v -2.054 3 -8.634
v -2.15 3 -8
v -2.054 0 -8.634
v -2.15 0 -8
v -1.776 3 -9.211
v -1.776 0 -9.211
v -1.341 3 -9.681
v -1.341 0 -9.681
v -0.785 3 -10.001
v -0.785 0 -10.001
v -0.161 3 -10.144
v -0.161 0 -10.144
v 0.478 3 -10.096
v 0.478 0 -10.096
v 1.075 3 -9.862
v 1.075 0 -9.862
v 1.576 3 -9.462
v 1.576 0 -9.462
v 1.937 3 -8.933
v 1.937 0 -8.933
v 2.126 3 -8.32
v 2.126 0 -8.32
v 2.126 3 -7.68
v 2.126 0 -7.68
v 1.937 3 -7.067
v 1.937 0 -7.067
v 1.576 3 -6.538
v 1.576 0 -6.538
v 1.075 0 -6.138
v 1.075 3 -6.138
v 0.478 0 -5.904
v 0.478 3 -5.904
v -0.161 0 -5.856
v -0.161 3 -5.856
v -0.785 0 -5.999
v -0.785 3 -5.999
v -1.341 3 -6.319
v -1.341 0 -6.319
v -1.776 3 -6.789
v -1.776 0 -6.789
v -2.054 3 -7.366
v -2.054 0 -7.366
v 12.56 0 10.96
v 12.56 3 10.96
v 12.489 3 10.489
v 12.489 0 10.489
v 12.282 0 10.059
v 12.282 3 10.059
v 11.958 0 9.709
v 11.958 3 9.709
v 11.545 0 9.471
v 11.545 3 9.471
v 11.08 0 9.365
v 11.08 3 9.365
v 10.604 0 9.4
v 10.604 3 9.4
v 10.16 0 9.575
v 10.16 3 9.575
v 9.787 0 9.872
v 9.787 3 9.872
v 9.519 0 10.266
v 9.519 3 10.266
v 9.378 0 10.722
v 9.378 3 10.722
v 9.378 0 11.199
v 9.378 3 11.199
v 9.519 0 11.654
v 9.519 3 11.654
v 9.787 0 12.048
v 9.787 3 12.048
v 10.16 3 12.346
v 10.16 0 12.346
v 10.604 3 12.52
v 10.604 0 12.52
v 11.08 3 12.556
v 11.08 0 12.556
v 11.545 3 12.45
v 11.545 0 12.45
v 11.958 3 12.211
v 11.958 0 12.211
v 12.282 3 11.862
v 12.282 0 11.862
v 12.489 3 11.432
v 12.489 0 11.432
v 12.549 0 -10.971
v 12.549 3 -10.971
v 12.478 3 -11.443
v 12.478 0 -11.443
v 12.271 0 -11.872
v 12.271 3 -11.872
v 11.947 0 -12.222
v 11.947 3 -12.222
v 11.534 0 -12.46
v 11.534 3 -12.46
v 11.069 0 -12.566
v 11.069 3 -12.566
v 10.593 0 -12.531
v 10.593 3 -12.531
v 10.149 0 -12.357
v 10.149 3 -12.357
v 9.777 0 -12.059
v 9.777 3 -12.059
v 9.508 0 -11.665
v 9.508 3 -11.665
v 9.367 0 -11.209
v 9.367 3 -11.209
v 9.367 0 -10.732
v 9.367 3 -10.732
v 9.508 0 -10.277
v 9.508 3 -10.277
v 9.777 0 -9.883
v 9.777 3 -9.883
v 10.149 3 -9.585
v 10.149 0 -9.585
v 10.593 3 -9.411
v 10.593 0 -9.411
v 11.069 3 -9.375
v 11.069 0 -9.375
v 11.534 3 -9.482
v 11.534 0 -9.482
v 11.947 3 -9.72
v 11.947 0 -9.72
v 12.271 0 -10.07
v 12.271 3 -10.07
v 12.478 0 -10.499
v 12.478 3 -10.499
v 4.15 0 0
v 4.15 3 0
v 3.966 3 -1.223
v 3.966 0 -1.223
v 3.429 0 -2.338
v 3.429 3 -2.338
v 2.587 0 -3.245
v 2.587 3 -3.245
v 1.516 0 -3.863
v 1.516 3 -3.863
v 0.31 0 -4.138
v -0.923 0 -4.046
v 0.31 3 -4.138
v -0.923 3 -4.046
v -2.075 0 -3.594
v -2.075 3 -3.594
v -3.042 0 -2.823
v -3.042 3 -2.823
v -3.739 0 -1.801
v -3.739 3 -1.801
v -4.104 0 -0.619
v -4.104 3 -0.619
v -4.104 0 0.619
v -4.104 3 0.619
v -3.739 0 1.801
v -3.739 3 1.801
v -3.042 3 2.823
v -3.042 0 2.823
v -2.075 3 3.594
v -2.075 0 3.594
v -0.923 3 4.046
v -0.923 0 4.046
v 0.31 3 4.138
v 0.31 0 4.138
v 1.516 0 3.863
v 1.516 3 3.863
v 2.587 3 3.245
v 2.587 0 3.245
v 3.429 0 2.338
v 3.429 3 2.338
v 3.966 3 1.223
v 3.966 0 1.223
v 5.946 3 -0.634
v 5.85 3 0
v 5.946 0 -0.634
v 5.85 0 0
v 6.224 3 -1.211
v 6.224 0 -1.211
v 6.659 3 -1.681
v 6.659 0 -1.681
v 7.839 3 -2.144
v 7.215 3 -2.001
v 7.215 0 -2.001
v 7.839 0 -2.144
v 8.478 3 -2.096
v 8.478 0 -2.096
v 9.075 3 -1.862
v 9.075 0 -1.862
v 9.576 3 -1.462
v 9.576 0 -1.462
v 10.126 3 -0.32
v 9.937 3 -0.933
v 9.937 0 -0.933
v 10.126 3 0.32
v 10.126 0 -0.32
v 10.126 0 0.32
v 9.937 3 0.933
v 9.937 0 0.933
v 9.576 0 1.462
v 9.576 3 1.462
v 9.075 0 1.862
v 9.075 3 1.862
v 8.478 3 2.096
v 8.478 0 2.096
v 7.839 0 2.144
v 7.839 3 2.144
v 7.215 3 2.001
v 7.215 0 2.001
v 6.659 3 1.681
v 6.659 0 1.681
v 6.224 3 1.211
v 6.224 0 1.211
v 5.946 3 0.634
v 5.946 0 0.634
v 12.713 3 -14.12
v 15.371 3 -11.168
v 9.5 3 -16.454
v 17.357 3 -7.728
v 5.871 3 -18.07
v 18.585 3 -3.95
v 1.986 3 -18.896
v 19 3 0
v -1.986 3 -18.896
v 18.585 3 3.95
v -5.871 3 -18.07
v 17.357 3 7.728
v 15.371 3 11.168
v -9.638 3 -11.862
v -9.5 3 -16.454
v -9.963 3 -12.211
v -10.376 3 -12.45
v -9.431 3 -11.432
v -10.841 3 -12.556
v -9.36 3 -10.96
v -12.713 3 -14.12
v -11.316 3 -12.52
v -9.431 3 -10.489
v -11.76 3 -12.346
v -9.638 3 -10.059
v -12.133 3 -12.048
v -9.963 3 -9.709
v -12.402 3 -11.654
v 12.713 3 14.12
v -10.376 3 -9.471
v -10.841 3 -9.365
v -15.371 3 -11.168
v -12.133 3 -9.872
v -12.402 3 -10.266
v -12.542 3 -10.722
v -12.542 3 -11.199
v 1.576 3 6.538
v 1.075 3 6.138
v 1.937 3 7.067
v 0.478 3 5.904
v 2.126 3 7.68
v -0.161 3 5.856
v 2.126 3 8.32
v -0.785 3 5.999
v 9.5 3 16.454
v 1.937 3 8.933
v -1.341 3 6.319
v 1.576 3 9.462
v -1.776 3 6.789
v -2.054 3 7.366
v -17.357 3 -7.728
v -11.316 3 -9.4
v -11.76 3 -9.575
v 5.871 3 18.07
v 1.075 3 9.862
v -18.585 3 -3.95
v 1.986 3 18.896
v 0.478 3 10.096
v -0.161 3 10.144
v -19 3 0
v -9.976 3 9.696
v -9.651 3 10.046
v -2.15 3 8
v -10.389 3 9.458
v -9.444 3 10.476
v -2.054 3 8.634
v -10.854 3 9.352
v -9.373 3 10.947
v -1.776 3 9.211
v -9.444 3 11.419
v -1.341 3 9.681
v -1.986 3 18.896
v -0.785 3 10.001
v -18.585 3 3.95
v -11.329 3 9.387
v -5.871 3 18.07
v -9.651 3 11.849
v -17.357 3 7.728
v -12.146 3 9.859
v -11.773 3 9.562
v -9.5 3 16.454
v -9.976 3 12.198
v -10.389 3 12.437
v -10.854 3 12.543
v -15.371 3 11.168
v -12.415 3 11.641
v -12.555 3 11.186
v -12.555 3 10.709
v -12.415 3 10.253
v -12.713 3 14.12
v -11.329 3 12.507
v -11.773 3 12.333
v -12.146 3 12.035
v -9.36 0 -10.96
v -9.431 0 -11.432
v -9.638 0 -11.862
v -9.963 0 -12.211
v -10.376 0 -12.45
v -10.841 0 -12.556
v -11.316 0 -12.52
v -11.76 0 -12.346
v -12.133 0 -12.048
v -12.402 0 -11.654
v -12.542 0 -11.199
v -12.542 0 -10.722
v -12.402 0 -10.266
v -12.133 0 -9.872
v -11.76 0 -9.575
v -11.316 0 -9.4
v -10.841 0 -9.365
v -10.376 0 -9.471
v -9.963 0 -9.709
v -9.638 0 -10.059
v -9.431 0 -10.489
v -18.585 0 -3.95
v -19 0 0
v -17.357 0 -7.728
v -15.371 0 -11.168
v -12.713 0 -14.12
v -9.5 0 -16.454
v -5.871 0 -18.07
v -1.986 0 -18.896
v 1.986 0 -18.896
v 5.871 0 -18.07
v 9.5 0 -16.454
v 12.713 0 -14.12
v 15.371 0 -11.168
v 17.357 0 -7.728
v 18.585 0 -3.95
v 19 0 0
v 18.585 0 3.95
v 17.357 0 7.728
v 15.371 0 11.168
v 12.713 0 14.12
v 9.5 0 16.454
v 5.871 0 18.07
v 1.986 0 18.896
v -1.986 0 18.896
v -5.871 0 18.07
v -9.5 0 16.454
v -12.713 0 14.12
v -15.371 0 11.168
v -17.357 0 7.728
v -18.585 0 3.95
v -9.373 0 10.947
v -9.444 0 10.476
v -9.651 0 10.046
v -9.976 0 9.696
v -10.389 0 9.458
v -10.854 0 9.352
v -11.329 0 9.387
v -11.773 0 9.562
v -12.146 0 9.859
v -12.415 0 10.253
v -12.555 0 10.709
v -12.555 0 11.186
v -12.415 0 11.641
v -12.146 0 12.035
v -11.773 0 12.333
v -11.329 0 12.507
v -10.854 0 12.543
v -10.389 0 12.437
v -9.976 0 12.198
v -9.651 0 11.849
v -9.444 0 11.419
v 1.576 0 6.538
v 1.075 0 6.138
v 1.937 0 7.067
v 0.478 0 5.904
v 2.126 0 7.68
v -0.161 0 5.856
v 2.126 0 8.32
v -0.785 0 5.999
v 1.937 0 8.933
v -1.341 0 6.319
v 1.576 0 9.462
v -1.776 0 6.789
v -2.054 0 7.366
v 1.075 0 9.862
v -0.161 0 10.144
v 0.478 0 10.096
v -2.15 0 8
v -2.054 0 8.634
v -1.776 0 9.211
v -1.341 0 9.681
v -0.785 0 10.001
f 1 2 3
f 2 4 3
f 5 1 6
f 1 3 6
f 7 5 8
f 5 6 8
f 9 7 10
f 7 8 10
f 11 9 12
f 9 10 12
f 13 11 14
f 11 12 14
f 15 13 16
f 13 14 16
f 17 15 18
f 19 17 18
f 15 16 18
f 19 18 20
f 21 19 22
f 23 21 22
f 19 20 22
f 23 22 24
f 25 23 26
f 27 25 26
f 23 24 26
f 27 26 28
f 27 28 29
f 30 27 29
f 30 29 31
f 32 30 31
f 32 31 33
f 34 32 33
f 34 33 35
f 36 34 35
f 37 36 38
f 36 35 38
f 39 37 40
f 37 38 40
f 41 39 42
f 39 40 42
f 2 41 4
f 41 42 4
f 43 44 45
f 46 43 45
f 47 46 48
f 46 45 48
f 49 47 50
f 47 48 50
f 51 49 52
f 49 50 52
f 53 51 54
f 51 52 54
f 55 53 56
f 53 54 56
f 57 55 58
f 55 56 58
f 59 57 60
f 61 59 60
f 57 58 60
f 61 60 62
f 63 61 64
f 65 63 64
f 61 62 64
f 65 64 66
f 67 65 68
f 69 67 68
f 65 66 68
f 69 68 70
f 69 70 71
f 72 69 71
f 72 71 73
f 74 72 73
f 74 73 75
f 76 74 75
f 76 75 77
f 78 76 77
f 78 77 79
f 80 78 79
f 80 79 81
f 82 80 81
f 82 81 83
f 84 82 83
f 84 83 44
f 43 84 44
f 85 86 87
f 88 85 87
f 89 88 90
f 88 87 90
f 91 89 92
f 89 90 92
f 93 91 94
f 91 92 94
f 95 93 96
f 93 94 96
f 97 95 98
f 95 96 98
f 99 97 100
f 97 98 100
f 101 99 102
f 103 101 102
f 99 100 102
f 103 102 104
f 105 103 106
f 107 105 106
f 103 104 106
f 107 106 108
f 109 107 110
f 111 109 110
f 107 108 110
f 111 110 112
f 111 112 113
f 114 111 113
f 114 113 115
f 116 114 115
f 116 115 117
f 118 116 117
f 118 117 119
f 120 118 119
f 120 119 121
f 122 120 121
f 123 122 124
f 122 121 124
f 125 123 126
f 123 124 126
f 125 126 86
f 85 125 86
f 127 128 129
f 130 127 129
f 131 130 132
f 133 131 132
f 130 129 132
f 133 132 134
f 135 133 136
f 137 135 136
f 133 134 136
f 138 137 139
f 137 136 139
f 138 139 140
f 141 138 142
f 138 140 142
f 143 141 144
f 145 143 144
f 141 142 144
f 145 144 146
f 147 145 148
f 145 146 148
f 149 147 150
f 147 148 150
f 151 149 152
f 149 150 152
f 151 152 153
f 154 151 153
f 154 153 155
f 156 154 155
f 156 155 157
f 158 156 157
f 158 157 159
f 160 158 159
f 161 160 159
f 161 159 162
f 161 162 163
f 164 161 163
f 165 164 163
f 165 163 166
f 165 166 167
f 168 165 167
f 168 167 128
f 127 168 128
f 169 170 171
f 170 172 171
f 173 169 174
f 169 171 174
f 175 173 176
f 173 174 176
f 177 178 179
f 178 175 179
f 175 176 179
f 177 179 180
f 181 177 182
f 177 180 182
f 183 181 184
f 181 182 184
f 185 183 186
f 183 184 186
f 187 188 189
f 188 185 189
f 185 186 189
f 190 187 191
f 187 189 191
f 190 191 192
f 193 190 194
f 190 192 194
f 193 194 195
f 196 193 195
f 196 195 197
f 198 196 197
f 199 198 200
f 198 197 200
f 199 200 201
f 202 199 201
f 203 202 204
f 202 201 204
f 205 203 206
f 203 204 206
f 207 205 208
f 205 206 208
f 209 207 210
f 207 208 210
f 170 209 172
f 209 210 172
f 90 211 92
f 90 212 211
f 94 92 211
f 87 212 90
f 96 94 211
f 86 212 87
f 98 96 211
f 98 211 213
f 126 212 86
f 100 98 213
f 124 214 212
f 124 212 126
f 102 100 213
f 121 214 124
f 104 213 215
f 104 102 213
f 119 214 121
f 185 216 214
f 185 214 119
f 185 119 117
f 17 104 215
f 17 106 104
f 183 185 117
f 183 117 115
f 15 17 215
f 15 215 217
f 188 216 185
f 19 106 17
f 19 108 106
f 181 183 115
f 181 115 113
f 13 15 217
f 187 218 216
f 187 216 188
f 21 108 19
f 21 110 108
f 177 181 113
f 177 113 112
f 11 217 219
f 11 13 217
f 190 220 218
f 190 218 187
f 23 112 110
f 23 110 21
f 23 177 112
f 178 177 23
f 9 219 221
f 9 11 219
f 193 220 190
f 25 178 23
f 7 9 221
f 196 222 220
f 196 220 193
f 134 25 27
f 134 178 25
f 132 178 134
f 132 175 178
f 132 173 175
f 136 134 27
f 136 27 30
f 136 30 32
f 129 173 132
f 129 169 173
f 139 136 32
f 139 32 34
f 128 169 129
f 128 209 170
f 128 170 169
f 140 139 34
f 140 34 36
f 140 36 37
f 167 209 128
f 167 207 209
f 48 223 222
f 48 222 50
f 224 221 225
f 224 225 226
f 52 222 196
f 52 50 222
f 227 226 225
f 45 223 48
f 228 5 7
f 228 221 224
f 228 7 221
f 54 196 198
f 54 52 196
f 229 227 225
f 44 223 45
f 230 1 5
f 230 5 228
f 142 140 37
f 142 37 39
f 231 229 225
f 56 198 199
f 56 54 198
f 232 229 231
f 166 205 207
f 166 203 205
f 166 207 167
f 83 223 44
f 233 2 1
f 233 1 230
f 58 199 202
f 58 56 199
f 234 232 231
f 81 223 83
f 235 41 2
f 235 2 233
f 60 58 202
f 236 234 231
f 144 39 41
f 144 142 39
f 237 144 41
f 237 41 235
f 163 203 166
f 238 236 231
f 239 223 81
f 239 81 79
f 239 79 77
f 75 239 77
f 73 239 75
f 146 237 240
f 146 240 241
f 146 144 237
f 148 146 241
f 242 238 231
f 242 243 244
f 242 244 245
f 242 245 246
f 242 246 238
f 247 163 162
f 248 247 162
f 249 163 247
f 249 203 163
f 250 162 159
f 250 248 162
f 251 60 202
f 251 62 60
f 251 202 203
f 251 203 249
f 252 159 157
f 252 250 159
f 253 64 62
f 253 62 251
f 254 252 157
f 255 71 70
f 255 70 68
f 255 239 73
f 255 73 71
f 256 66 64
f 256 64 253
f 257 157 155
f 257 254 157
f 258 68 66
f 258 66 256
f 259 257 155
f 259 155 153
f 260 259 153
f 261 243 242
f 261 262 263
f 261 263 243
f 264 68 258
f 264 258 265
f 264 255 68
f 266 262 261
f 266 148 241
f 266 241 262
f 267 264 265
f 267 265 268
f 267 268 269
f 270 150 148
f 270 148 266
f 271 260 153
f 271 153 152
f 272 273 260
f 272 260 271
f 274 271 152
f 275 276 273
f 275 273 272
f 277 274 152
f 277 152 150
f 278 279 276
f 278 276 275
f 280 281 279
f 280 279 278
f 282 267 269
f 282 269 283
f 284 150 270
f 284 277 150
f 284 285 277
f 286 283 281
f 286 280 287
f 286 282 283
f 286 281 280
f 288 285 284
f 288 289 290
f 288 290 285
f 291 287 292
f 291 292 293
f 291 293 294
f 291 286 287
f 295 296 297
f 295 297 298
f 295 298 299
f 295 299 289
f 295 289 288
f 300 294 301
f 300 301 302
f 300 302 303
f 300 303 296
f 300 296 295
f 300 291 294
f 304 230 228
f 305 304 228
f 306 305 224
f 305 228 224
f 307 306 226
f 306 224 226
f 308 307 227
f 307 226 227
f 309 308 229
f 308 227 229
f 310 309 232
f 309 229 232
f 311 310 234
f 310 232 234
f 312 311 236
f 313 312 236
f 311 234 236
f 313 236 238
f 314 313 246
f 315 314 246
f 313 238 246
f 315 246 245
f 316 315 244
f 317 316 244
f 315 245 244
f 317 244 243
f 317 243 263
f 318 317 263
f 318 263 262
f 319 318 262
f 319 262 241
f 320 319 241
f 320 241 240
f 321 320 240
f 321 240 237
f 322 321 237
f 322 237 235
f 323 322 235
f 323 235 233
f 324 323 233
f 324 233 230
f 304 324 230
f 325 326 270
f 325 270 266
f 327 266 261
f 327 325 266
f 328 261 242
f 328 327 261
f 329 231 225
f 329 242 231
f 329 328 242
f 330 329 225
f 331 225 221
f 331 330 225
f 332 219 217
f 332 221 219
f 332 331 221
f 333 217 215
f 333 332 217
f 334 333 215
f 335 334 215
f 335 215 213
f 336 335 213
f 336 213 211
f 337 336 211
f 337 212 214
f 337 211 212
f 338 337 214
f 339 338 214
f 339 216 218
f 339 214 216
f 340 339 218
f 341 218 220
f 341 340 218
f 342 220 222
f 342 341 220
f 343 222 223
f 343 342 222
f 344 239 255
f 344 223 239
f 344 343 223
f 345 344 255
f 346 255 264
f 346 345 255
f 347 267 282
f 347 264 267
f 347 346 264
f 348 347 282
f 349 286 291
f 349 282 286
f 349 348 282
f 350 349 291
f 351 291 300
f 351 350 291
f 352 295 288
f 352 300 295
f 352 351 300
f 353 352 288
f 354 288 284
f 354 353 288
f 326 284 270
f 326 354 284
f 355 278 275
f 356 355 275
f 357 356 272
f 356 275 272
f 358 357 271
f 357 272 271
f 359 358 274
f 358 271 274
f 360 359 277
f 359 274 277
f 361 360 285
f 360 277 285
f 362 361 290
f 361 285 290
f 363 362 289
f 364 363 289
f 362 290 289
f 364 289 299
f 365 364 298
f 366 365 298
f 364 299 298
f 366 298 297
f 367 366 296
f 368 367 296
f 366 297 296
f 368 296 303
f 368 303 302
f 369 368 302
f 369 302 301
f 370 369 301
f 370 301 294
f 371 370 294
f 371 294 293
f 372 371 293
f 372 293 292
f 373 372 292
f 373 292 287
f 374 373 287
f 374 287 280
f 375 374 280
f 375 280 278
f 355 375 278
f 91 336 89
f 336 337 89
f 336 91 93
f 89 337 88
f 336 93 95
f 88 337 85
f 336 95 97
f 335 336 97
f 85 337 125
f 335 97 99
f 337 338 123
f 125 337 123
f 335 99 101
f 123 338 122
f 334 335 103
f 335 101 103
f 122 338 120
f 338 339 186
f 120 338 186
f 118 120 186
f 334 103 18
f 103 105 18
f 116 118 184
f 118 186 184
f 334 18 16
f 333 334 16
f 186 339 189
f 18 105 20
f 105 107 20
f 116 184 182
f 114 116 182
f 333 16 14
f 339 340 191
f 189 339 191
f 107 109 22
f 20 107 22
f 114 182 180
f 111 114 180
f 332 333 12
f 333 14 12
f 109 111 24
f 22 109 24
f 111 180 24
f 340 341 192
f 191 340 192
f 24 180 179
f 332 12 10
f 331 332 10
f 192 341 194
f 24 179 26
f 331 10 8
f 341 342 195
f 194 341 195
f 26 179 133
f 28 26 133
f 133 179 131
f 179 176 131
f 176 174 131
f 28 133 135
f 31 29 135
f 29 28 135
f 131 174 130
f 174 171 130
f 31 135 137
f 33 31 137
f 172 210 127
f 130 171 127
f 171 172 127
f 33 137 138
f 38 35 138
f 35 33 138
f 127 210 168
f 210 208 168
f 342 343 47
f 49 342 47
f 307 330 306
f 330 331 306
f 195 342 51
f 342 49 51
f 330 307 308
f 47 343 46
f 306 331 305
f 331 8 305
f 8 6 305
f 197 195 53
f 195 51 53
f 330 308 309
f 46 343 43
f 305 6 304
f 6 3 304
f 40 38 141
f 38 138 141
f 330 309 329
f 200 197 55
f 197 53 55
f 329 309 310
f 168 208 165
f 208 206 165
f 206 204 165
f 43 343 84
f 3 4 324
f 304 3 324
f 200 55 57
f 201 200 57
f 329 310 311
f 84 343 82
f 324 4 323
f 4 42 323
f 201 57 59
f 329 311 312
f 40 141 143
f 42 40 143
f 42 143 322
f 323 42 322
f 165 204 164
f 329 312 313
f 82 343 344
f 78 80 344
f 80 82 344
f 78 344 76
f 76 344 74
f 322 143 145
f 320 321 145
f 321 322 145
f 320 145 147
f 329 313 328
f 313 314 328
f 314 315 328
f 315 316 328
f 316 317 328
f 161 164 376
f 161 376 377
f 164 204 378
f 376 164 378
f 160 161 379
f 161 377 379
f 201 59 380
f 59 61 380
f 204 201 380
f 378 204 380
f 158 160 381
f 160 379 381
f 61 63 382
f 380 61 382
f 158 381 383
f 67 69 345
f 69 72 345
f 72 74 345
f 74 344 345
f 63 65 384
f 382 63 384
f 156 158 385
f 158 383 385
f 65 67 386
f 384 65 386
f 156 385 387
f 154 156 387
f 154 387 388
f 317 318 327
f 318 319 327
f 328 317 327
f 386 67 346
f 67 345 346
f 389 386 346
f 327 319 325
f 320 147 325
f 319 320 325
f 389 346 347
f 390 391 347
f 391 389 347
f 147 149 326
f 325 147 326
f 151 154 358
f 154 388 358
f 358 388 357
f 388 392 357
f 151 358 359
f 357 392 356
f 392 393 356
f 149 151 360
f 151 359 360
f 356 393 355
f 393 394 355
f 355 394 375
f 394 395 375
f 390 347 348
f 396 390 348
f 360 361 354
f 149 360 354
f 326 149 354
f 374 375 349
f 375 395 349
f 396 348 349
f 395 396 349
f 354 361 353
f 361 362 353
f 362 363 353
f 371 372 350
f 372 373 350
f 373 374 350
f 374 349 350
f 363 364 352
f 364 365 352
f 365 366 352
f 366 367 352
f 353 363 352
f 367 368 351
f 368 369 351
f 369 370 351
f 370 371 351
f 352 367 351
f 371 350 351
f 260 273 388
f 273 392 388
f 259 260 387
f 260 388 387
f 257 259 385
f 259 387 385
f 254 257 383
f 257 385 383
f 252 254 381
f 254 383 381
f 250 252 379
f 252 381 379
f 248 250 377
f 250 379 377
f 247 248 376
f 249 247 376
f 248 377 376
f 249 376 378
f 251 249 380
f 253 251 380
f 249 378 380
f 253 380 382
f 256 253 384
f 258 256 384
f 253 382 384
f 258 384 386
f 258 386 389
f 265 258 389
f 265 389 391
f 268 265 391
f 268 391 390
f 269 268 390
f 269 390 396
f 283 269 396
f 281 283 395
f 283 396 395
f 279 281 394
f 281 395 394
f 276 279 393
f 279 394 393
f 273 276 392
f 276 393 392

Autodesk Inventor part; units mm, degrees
ref_plane "YZ Plane" through (0, 0, 0) normal (1, 0, 0) x (0, 1, 0)
ref_plane "XZ Plane" through (0, 0, 0) normal (0, 1, 0) x (-1, 0, 0)
ref_plane "XY Plane" through (0, 0, 0) normal (0, 0, 1) x (1, 0, 0)
sketch "スケッチ1" plane through (0, 0, 0) normal (0, 1, 0) x (-1, 0, 0)
  circle A0 centre (0, 0) radius 19
  line L0 (0, 0) -> (0, 8)
  line L1 (0, 0) -> (-8, 0)
  line L2 (0, 0) -> (0, -8)
  circle A1 centre (0, -8) radius 2.15
  circle A2 centre (0, 8) radius 2.15
  circle A3 centre (-8, 0) radius 2.15
  dimension "d0" = 38
  dimension "d1" = 8
  dimension "d2" = 8
  dimension "d4" = 8
  dimension "d5" = 4.3
  dimension "d6" = 4.3
  dimension "d7" = 4.3
extrude "押し出し1" add sketch "スケッチ1" along normal blind 3
sketch "スケッチ3" plane through (0, 3, 0) normal (0, 1, 0) x (1, 0, 0)
  circle A0 centre (0, 0) radius 4.15
  dimension "d24" = 8.3
extrude "押し出し3" cut sketch "スケッチ3" against normal blind 10
sketch "スケッチ4" plane through (0, 3, 0) normal (0, 1, 0) x (1, 0, 0)
  line L0 (0, 0) -> (-10.9602, 10.9602)
  line L1 (0, 0) -> (15.5, 0) construction
  circle A0 centre (-10.9602, 10.9602) radius 1.6
  line L2 (0, 0) -> (10.9494, 10.9709)
  circle A1 centre (10.9494, 10.9709) radius 1.6
  line L3 (0, 0) -> (-10.9731, -10.9472)
  circle A2 centre (-10.9731, -10.9472) radius 1.6
  line L4 (0, 0) -> (10.9602, -10.9602)
  line L5 (0, 0) -> (15.5, 0) construction
  circle A3 centre (10.9602, -10.9602) radius 1.6
  circle A4 centre (0, 0) radius 12.5
  dimension "d27" = 15.5
  dimension "d28" = 135
  dimension "d29" = 3.2
  dimension "d30" = 15.5
  dimension "d31" = 3.2
  dimension "d32" = 15.5
  dimension "d33" = 3.2
  dimension "d34" = 15.5
  dimension "d35" = 45
  dimension "d36" = 3.2
  dimension "d37" = 25
extrude "押し出し4" cut sketch "スケッチ4" against normal blind 10 contours A0 | A1 | A2 | A3
properties part number "フランジ"
